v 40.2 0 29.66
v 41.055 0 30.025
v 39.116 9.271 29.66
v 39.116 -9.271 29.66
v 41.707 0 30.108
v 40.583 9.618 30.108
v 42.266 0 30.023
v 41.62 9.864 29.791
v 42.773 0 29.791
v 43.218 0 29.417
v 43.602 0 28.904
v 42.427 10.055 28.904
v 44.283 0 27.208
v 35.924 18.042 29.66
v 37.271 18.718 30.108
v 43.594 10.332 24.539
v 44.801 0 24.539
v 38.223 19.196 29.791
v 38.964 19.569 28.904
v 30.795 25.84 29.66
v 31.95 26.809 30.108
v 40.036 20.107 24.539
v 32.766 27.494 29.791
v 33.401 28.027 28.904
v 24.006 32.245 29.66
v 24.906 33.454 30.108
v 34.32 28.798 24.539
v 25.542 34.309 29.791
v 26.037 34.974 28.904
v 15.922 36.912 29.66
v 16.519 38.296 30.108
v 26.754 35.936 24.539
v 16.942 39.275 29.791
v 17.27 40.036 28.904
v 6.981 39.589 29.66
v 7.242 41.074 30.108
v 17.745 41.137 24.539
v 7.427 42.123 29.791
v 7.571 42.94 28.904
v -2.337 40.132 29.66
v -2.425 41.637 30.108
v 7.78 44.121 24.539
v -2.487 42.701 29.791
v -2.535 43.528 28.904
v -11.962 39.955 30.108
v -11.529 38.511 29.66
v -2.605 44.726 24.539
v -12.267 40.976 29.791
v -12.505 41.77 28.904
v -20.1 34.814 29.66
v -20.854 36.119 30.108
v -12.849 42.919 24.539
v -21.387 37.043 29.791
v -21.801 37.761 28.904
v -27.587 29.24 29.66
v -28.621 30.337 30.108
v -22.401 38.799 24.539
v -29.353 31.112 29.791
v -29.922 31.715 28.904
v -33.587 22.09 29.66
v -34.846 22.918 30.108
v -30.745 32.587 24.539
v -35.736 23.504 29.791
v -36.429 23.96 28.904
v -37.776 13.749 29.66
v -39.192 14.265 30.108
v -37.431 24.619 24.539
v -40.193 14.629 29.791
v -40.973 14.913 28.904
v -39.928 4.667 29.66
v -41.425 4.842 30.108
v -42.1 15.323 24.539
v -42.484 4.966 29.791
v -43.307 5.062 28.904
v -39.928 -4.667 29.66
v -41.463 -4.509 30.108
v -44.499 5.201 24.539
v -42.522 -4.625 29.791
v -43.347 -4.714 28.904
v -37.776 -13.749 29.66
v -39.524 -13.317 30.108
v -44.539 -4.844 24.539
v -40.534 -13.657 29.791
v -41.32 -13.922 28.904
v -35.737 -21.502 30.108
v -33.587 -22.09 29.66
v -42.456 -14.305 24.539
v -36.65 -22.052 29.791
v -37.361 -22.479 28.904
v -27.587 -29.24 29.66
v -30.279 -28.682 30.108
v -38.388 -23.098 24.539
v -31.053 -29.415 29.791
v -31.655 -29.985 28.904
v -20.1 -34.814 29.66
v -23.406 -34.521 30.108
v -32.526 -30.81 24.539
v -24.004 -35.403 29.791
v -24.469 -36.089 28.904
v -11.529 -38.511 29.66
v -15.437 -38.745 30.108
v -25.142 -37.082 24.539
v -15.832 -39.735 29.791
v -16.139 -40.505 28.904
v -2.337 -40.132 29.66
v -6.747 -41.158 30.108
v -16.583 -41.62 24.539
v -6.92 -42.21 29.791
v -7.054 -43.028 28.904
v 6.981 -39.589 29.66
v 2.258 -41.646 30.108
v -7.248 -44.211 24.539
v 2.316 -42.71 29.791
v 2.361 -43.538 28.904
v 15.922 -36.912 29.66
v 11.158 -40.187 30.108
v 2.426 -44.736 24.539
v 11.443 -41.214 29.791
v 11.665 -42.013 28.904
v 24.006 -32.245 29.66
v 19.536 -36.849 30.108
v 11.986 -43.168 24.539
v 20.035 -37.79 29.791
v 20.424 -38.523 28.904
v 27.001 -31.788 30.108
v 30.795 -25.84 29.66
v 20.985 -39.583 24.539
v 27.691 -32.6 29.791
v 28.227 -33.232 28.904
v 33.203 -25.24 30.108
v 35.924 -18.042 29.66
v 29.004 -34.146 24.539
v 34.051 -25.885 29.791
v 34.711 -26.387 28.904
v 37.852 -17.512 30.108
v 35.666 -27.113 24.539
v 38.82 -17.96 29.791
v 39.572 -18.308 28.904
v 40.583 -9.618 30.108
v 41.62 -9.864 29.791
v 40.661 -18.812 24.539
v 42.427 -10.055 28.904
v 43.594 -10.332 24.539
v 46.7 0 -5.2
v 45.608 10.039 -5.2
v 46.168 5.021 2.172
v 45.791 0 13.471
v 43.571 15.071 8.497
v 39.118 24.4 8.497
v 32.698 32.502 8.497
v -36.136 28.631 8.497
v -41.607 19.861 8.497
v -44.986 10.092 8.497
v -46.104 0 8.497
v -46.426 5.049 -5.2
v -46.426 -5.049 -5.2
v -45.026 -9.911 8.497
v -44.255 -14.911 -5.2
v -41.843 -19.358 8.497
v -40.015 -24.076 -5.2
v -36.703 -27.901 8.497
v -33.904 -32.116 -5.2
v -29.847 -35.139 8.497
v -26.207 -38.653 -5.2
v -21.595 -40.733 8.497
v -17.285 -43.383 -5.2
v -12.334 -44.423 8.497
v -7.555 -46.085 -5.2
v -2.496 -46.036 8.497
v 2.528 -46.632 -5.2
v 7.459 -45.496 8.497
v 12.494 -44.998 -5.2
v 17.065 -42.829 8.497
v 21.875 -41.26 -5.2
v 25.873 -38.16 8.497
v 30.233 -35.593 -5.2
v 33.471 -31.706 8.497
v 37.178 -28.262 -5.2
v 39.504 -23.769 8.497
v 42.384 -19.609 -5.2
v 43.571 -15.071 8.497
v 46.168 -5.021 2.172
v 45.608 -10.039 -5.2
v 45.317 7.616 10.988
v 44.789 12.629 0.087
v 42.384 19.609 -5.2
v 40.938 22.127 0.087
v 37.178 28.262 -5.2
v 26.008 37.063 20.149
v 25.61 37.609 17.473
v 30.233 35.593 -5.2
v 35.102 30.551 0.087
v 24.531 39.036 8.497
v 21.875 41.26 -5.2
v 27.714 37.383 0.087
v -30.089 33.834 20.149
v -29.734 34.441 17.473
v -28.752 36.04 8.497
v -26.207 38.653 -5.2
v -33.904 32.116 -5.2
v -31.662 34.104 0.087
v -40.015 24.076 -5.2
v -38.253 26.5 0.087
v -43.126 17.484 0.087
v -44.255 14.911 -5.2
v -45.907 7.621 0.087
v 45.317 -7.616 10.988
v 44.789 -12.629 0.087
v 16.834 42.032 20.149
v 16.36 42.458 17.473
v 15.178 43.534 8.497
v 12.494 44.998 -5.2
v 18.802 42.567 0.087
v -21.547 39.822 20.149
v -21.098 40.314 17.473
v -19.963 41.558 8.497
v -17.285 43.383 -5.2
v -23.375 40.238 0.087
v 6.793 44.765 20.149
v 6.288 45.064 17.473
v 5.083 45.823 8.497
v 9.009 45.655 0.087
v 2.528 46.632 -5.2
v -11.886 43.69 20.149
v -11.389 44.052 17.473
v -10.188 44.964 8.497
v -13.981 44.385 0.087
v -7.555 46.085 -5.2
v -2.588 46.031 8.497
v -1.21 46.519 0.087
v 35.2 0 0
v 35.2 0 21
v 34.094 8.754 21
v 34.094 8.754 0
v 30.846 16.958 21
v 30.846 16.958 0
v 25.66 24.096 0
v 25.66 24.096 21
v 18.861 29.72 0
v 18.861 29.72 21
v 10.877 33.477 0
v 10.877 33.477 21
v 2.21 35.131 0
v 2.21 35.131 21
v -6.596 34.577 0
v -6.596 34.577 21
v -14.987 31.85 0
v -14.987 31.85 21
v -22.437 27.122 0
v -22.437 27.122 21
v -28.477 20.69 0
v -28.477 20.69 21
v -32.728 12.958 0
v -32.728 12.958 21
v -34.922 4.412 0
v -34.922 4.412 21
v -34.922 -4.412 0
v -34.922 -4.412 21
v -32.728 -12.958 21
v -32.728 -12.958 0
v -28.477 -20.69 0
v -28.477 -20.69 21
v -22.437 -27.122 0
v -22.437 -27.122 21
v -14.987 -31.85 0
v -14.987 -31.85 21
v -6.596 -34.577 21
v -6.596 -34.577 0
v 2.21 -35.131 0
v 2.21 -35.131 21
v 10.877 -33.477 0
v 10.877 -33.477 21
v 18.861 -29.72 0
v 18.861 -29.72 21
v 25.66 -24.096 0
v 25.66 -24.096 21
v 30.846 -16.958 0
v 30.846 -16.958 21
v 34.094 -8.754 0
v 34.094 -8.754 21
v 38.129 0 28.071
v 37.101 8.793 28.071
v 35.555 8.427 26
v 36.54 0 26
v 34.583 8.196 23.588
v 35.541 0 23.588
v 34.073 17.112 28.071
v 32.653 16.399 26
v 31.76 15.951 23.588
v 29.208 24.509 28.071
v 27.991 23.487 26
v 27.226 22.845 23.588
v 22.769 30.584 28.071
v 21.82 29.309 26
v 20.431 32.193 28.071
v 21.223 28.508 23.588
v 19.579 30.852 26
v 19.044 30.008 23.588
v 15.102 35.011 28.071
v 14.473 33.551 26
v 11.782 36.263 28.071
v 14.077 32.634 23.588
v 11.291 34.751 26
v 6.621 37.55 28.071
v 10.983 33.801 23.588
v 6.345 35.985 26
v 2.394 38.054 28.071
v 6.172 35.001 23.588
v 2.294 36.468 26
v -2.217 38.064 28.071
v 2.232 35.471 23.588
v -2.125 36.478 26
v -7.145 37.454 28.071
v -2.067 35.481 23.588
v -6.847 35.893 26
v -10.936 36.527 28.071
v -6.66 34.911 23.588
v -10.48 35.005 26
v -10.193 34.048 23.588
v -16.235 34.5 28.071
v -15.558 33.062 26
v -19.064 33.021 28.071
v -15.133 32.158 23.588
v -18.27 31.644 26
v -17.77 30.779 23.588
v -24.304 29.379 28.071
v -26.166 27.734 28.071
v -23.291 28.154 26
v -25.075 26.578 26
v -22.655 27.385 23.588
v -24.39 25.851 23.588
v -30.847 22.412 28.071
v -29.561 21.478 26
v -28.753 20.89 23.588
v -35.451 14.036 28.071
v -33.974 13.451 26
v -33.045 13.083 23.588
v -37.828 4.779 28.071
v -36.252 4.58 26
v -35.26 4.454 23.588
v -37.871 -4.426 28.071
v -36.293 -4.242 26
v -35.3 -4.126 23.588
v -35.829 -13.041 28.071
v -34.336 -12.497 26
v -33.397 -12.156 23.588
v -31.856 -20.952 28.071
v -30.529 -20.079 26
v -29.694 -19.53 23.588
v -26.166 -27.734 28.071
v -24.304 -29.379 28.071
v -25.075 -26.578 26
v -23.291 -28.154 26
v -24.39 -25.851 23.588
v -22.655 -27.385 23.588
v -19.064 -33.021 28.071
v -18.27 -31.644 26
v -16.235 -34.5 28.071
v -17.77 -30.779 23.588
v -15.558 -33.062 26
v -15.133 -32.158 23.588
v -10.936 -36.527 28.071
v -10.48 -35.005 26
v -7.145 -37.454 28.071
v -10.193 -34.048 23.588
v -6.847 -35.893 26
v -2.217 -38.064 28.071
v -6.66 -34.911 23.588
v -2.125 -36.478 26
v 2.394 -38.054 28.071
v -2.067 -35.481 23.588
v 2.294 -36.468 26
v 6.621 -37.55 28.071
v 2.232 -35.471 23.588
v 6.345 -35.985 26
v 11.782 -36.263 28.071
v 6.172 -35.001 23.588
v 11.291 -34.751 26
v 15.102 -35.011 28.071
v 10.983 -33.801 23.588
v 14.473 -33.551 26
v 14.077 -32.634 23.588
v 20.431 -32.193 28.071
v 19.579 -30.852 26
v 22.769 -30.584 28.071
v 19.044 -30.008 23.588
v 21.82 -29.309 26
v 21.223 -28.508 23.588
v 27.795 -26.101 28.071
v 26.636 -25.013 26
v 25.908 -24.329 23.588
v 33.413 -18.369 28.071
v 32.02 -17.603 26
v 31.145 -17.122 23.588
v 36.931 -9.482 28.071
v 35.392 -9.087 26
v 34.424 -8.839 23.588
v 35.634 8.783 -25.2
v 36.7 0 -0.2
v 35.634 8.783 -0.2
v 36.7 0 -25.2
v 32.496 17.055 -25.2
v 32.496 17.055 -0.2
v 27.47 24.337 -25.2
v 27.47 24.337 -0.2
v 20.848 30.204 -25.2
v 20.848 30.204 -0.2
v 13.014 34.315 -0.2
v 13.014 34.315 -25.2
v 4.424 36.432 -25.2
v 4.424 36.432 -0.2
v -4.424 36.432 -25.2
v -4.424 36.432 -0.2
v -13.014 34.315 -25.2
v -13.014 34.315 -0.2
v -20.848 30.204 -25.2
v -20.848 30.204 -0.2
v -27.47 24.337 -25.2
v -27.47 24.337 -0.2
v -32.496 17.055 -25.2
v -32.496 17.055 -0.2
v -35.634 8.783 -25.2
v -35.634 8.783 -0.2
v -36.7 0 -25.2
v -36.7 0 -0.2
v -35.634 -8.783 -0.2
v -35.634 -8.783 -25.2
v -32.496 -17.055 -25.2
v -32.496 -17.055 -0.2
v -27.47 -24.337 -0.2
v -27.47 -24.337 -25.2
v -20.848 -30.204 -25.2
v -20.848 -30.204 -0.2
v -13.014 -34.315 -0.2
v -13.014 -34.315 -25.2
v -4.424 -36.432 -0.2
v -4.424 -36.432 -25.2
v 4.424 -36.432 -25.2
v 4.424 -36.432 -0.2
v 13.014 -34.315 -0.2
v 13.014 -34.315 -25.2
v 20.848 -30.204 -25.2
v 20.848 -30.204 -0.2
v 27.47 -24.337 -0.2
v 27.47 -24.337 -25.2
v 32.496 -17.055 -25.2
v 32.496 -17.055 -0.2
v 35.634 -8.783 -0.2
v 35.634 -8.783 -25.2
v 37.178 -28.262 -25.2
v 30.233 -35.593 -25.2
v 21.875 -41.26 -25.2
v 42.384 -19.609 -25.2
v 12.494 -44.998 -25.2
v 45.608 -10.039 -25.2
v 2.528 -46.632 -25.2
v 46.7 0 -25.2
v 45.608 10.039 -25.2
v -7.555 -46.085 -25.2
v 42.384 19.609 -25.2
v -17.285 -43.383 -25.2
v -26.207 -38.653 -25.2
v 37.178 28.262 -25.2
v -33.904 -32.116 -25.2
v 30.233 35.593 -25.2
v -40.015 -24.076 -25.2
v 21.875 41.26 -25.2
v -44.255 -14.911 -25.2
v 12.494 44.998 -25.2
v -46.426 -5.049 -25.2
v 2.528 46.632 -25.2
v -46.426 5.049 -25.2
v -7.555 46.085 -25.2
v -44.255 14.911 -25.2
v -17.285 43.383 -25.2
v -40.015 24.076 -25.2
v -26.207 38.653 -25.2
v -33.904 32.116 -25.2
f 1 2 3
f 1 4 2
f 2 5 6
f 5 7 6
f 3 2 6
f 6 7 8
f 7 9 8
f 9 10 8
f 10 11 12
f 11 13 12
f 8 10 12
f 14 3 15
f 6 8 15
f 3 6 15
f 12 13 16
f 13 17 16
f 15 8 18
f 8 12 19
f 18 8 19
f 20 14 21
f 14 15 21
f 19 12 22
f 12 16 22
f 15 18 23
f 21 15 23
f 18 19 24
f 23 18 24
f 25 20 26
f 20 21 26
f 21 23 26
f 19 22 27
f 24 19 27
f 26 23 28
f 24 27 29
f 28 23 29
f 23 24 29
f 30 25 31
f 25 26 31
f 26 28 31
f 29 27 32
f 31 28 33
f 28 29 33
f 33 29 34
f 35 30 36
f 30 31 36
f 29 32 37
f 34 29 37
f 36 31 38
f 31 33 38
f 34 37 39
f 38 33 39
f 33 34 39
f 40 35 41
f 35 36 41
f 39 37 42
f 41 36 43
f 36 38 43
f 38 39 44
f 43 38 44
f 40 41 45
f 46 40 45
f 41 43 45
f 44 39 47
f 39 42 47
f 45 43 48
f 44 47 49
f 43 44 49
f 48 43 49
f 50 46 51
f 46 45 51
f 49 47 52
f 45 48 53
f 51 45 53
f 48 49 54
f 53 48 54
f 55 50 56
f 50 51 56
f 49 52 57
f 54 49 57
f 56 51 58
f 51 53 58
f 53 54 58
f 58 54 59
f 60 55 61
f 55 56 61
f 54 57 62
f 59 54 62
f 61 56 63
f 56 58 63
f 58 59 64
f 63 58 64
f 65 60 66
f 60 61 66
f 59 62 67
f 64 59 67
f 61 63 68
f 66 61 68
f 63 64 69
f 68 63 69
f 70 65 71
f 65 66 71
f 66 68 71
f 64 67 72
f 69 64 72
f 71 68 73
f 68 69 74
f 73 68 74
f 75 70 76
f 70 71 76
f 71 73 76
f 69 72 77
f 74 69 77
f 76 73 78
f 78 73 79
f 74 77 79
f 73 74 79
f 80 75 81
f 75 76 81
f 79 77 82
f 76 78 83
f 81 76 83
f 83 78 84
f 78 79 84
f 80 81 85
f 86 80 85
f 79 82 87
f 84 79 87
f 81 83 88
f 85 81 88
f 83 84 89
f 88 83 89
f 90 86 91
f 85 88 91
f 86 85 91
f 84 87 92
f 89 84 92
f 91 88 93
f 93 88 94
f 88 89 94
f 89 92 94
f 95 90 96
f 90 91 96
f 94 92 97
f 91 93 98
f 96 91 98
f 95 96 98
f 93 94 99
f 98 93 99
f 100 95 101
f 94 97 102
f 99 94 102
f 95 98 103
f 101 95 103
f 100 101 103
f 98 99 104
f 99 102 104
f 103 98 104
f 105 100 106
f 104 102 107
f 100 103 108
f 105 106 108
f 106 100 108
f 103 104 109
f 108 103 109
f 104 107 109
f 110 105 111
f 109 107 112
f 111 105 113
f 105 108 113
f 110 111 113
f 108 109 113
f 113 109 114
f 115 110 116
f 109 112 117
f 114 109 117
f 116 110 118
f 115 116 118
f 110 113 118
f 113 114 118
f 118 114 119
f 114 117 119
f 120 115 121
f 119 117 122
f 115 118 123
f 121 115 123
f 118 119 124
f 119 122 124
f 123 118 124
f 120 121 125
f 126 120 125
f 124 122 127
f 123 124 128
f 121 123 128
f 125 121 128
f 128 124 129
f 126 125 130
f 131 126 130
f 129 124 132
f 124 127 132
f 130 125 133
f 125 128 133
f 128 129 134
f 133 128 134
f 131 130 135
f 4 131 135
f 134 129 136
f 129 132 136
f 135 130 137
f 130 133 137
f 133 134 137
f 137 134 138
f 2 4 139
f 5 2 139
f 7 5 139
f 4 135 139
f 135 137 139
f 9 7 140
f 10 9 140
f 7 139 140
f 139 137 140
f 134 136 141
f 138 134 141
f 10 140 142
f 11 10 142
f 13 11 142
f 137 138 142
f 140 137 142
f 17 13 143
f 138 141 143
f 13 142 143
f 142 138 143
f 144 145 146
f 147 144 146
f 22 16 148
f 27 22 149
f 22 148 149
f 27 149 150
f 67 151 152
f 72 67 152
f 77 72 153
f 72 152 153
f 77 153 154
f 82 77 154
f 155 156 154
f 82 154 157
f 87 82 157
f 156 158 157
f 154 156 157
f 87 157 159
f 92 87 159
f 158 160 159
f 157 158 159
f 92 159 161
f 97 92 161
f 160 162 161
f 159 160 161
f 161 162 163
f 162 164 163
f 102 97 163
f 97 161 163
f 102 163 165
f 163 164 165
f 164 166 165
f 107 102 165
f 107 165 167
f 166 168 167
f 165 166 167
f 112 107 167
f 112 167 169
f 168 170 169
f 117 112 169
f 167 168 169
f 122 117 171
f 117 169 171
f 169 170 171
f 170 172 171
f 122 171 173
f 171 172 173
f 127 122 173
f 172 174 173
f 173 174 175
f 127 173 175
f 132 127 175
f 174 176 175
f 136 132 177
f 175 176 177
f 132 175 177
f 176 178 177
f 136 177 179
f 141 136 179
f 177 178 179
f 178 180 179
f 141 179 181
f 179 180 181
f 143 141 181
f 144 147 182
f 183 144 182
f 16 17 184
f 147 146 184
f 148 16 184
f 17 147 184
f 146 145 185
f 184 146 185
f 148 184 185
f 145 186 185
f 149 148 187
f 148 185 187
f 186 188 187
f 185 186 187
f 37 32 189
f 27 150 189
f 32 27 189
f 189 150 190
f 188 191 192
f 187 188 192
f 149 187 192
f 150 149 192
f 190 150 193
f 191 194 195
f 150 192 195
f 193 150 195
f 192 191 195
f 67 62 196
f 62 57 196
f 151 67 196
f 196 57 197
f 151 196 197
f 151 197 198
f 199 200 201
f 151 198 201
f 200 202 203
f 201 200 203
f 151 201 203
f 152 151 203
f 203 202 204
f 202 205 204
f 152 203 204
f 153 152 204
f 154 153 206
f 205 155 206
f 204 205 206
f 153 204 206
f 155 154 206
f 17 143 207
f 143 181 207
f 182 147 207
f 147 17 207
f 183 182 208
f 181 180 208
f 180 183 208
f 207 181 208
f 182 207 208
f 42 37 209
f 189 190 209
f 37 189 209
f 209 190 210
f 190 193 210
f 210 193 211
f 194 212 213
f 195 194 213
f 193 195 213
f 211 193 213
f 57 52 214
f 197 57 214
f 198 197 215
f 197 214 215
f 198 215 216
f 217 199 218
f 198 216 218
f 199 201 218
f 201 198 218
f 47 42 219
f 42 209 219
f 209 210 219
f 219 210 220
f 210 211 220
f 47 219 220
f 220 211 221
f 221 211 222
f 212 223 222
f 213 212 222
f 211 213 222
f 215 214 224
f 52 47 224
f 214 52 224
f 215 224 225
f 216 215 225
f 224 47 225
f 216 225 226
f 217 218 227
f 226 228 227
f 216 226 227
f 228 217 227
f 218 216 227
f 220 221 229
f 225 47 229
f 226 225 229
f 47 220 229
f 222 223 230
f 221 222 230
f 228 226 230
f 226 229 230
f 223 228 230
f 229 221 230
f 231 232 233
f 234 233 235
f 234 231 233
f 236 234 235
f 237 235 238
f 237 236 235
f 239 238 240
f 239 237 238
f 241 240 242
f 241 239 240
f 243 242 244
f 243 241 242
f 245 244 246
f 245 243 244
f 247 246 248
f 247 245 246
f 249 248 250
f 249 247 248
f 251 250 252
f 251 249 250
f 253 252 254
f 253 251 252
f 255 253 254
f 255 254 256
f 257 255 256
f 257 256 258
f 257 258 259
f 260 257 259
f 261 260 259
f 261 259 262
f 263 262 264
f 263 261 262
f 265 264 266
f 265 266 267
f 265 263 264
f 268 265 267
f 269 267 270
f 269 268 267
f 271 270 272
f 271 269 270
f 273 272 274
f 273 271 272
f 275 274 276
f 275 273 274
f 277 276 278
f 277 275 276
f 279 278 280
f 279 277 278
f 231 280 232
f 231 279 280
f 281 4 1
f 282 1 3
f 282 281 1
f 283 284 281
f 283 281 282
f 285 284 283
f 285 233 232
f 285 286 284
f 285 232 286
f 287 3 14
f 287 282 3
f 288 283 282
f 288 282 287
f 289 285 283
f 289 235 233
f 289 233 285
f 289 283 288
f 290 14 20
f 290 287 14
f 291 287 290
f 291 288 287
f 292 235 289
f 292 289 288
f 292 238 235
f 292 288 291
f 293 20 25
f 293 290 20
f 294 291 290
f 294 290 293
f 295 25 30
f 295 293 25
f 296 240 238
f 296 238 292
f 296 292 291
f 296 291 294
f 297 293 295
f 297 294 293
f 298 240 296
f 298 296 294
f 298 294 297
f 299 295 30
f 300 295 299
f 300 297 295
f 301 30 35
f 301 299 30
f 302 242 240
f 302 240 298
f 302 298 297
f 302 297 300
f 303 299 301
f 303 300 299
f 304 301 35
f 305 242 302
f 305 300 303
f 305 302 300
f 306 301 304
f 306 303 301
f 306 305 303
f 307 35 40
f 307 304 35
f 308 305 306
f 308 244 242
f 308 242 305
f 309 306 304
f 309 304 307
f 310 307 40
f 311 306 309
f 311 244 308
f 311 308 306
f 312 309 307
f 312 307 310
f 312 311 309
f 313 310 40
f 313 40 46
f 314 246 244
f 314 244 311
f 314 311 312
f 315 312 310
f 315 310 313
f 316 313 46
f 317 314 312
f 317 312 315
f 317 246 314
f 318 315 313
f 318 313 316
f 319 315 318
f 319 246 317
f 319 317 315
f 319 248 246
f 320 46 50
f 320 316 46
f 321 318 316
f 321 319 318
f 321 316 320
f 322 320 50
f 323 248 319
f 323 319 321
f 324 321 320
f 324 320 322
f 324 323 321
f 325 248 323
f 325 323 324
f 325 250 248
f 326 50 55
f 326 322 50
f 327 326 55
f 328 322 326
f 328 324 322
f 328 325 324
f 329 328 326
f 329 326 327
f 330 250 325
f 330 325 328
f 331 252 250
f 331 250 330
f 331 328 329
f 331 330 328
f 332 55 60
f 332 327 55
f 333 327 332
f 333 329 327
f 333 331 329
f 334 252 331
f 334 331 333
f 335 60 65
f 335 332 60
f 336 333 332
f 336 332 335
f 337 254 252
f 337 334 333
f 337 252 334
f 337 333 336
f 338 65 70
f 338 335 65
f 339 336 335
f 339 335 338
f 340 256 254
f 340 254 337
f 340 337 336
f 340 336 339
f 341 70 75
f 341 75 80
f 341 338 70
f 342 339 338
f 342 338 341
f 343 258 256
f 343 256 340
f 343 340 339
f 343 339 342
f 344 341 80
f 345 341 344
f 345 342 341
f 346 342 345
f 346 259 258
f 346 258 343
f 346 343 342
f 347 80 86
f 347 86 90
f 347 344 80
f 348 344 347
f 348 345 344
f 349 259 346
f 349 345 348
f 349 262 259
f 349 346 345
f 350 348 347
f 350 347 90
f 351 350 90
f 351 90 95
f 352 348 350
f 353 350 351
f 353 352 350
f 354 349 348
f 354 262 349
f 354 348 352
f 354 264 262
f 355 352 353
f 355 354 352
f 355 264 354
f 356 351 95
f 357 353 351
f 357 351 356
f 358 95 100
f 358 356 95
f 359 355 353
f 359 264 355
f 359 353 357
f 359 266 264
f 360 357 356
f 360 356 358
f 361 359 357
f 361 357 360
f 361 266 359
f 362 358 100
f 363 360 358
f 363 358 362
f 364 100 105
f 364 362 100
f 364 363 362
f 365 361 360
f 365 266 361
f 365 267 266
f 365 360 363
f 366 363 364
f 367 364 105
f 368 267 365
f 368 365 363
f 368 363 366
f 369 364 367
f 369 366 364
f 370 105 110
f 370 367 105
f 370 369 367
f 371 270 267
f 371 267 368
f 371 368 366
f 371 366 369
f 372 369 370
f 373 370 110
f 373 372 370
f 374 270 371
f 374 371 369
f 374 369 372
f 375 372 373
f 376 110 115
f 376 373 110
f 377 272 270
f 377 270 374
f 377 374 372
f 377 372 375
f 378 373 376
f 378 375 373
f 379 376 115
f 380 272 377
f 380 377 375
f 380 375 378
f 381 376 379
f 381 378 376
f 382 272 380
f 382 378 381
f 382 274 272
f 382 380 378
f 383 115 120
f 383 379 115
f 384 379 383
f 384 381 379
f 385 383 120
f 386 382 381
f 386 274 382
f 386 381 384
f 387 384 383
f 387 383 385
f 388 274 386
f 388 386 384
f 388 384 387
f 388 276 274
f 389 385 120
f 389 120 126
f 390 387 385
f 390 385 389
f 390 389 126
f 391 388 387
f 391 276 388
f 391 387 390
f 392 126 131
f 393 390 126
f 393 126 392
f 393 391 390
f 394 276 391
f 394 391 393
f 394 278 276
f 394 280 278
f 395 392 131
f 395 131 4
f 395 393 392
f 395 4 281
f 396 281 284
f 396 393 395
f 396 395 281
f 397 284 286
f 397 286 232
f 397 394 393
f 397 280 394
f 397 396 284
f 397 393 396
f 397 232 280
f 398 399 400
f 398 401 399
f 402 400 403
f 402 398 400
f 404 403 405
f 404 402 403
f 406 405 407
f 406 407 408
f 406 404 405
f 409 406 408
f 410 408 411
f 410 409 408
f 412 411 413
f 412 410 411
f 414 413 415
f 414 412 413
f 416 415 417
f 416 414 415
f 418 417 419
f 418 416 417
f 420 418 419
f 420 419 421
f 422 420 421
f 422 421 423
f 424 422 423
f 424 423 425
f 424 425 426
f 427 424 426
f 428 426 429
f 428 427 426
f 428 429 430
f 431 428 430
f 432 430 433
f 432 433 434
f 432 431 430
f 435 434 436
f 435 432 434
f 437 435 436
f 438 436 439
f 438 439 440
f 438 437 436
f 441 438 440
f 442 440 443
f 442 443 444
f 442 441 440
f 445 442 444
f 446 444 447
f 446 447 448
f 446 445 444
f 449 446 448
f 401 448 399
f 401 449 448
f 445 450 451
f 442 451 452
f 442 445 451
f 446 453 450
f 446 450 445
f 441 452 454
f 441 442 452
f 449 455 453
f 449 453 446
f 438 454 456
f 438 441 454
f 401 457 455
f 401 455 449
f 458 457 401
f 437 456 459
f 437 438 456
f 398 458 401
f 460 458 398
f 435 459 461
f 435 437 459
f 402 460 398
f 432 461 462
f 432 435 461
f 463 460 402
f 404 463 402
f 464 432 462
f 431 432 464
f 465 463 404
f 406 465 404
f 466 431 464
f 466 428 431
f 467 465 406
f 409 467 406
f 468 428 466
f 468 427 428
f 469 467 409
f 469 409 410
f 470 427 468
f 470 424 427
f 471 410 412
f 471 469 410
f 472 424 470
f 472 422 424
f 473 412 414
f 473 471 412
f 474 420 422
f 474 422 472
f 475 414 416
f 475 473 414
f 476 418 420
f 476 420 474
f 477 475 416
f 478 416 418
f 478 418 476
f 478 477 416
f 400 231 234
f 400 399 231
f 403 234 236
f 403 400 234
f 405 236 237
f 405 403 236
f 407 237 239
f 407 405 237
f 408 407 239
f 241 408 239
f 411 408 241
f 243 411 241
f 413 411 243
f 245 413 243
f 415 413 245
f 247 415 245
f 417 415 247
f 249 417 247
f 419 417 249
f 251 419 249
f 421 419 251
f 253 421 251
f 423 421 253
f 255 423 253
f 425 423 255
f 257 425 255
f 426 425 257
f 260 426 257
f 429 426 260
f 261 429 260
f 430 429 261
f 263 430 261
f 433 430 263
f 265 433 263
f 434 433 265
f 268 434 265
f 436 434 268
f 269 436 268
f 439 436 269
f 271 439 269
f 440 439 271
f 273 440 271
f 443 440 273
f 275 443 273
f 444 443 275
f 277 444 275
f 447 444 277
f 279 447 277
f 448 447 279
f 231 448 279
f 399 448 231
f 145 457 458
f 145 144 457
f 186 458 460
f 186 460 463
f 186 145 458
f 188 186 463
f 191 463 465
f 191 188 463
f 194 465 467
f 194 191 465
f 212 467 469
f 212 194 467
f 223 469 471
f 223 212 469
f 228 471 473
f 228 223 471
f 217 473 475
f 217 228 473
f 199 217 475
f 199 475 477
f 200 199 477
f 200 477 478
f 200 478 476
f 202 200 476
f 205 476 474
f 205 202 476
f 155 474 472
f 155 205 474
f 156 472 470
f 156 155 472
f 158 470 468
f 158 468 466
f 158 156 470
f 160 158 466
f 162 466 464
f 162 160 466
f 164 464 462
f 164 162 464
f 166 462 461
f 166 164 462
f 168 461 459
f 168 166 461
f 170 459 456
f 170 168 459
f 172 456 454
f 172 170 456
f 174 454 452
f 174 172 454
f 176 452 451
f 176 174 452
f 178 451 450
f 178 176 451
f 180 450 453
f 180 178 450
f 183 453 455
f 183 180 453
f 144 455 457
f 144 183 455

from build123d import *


with BuildPart() as f1:
    # F0 (on Front) → F1 (revolve)
    with BuildSketch(Plane.XZ):
        with BuildLine():
            Line((35.2, 21), (35.2, 0))
            Line((35.2, 0), (36.7, -0.2))
            Line((36.7, -0.2), (36.7, -25.2))
            Line((36.7, -25.2), (46.7, -25.2))
            Line((46.7, -25.2), (46.7, -5.2))
            add(Edge.make_bspline(
                [(40.2, 29.6602540378), (41.2535322891, 30.2793717629), (43.9939234613, 30.1539923233), (45.5662337366, 21.1544722527), (46.7, -1.8974630171), (46.7, -5.2)],
                knots=[0, 0, 0, 0, 0.1698510181, 0.4758724969, 1, 1, 1, 1], degree=3))
            ThreePointArc((40.2, 29.6602540378), (36.5397459622, 26), (35.2, 21))
        make_face()
    revolve(axis=Axis((0, 0, 22.5353781134), (0, 0, 1)))


solid = f1.part
